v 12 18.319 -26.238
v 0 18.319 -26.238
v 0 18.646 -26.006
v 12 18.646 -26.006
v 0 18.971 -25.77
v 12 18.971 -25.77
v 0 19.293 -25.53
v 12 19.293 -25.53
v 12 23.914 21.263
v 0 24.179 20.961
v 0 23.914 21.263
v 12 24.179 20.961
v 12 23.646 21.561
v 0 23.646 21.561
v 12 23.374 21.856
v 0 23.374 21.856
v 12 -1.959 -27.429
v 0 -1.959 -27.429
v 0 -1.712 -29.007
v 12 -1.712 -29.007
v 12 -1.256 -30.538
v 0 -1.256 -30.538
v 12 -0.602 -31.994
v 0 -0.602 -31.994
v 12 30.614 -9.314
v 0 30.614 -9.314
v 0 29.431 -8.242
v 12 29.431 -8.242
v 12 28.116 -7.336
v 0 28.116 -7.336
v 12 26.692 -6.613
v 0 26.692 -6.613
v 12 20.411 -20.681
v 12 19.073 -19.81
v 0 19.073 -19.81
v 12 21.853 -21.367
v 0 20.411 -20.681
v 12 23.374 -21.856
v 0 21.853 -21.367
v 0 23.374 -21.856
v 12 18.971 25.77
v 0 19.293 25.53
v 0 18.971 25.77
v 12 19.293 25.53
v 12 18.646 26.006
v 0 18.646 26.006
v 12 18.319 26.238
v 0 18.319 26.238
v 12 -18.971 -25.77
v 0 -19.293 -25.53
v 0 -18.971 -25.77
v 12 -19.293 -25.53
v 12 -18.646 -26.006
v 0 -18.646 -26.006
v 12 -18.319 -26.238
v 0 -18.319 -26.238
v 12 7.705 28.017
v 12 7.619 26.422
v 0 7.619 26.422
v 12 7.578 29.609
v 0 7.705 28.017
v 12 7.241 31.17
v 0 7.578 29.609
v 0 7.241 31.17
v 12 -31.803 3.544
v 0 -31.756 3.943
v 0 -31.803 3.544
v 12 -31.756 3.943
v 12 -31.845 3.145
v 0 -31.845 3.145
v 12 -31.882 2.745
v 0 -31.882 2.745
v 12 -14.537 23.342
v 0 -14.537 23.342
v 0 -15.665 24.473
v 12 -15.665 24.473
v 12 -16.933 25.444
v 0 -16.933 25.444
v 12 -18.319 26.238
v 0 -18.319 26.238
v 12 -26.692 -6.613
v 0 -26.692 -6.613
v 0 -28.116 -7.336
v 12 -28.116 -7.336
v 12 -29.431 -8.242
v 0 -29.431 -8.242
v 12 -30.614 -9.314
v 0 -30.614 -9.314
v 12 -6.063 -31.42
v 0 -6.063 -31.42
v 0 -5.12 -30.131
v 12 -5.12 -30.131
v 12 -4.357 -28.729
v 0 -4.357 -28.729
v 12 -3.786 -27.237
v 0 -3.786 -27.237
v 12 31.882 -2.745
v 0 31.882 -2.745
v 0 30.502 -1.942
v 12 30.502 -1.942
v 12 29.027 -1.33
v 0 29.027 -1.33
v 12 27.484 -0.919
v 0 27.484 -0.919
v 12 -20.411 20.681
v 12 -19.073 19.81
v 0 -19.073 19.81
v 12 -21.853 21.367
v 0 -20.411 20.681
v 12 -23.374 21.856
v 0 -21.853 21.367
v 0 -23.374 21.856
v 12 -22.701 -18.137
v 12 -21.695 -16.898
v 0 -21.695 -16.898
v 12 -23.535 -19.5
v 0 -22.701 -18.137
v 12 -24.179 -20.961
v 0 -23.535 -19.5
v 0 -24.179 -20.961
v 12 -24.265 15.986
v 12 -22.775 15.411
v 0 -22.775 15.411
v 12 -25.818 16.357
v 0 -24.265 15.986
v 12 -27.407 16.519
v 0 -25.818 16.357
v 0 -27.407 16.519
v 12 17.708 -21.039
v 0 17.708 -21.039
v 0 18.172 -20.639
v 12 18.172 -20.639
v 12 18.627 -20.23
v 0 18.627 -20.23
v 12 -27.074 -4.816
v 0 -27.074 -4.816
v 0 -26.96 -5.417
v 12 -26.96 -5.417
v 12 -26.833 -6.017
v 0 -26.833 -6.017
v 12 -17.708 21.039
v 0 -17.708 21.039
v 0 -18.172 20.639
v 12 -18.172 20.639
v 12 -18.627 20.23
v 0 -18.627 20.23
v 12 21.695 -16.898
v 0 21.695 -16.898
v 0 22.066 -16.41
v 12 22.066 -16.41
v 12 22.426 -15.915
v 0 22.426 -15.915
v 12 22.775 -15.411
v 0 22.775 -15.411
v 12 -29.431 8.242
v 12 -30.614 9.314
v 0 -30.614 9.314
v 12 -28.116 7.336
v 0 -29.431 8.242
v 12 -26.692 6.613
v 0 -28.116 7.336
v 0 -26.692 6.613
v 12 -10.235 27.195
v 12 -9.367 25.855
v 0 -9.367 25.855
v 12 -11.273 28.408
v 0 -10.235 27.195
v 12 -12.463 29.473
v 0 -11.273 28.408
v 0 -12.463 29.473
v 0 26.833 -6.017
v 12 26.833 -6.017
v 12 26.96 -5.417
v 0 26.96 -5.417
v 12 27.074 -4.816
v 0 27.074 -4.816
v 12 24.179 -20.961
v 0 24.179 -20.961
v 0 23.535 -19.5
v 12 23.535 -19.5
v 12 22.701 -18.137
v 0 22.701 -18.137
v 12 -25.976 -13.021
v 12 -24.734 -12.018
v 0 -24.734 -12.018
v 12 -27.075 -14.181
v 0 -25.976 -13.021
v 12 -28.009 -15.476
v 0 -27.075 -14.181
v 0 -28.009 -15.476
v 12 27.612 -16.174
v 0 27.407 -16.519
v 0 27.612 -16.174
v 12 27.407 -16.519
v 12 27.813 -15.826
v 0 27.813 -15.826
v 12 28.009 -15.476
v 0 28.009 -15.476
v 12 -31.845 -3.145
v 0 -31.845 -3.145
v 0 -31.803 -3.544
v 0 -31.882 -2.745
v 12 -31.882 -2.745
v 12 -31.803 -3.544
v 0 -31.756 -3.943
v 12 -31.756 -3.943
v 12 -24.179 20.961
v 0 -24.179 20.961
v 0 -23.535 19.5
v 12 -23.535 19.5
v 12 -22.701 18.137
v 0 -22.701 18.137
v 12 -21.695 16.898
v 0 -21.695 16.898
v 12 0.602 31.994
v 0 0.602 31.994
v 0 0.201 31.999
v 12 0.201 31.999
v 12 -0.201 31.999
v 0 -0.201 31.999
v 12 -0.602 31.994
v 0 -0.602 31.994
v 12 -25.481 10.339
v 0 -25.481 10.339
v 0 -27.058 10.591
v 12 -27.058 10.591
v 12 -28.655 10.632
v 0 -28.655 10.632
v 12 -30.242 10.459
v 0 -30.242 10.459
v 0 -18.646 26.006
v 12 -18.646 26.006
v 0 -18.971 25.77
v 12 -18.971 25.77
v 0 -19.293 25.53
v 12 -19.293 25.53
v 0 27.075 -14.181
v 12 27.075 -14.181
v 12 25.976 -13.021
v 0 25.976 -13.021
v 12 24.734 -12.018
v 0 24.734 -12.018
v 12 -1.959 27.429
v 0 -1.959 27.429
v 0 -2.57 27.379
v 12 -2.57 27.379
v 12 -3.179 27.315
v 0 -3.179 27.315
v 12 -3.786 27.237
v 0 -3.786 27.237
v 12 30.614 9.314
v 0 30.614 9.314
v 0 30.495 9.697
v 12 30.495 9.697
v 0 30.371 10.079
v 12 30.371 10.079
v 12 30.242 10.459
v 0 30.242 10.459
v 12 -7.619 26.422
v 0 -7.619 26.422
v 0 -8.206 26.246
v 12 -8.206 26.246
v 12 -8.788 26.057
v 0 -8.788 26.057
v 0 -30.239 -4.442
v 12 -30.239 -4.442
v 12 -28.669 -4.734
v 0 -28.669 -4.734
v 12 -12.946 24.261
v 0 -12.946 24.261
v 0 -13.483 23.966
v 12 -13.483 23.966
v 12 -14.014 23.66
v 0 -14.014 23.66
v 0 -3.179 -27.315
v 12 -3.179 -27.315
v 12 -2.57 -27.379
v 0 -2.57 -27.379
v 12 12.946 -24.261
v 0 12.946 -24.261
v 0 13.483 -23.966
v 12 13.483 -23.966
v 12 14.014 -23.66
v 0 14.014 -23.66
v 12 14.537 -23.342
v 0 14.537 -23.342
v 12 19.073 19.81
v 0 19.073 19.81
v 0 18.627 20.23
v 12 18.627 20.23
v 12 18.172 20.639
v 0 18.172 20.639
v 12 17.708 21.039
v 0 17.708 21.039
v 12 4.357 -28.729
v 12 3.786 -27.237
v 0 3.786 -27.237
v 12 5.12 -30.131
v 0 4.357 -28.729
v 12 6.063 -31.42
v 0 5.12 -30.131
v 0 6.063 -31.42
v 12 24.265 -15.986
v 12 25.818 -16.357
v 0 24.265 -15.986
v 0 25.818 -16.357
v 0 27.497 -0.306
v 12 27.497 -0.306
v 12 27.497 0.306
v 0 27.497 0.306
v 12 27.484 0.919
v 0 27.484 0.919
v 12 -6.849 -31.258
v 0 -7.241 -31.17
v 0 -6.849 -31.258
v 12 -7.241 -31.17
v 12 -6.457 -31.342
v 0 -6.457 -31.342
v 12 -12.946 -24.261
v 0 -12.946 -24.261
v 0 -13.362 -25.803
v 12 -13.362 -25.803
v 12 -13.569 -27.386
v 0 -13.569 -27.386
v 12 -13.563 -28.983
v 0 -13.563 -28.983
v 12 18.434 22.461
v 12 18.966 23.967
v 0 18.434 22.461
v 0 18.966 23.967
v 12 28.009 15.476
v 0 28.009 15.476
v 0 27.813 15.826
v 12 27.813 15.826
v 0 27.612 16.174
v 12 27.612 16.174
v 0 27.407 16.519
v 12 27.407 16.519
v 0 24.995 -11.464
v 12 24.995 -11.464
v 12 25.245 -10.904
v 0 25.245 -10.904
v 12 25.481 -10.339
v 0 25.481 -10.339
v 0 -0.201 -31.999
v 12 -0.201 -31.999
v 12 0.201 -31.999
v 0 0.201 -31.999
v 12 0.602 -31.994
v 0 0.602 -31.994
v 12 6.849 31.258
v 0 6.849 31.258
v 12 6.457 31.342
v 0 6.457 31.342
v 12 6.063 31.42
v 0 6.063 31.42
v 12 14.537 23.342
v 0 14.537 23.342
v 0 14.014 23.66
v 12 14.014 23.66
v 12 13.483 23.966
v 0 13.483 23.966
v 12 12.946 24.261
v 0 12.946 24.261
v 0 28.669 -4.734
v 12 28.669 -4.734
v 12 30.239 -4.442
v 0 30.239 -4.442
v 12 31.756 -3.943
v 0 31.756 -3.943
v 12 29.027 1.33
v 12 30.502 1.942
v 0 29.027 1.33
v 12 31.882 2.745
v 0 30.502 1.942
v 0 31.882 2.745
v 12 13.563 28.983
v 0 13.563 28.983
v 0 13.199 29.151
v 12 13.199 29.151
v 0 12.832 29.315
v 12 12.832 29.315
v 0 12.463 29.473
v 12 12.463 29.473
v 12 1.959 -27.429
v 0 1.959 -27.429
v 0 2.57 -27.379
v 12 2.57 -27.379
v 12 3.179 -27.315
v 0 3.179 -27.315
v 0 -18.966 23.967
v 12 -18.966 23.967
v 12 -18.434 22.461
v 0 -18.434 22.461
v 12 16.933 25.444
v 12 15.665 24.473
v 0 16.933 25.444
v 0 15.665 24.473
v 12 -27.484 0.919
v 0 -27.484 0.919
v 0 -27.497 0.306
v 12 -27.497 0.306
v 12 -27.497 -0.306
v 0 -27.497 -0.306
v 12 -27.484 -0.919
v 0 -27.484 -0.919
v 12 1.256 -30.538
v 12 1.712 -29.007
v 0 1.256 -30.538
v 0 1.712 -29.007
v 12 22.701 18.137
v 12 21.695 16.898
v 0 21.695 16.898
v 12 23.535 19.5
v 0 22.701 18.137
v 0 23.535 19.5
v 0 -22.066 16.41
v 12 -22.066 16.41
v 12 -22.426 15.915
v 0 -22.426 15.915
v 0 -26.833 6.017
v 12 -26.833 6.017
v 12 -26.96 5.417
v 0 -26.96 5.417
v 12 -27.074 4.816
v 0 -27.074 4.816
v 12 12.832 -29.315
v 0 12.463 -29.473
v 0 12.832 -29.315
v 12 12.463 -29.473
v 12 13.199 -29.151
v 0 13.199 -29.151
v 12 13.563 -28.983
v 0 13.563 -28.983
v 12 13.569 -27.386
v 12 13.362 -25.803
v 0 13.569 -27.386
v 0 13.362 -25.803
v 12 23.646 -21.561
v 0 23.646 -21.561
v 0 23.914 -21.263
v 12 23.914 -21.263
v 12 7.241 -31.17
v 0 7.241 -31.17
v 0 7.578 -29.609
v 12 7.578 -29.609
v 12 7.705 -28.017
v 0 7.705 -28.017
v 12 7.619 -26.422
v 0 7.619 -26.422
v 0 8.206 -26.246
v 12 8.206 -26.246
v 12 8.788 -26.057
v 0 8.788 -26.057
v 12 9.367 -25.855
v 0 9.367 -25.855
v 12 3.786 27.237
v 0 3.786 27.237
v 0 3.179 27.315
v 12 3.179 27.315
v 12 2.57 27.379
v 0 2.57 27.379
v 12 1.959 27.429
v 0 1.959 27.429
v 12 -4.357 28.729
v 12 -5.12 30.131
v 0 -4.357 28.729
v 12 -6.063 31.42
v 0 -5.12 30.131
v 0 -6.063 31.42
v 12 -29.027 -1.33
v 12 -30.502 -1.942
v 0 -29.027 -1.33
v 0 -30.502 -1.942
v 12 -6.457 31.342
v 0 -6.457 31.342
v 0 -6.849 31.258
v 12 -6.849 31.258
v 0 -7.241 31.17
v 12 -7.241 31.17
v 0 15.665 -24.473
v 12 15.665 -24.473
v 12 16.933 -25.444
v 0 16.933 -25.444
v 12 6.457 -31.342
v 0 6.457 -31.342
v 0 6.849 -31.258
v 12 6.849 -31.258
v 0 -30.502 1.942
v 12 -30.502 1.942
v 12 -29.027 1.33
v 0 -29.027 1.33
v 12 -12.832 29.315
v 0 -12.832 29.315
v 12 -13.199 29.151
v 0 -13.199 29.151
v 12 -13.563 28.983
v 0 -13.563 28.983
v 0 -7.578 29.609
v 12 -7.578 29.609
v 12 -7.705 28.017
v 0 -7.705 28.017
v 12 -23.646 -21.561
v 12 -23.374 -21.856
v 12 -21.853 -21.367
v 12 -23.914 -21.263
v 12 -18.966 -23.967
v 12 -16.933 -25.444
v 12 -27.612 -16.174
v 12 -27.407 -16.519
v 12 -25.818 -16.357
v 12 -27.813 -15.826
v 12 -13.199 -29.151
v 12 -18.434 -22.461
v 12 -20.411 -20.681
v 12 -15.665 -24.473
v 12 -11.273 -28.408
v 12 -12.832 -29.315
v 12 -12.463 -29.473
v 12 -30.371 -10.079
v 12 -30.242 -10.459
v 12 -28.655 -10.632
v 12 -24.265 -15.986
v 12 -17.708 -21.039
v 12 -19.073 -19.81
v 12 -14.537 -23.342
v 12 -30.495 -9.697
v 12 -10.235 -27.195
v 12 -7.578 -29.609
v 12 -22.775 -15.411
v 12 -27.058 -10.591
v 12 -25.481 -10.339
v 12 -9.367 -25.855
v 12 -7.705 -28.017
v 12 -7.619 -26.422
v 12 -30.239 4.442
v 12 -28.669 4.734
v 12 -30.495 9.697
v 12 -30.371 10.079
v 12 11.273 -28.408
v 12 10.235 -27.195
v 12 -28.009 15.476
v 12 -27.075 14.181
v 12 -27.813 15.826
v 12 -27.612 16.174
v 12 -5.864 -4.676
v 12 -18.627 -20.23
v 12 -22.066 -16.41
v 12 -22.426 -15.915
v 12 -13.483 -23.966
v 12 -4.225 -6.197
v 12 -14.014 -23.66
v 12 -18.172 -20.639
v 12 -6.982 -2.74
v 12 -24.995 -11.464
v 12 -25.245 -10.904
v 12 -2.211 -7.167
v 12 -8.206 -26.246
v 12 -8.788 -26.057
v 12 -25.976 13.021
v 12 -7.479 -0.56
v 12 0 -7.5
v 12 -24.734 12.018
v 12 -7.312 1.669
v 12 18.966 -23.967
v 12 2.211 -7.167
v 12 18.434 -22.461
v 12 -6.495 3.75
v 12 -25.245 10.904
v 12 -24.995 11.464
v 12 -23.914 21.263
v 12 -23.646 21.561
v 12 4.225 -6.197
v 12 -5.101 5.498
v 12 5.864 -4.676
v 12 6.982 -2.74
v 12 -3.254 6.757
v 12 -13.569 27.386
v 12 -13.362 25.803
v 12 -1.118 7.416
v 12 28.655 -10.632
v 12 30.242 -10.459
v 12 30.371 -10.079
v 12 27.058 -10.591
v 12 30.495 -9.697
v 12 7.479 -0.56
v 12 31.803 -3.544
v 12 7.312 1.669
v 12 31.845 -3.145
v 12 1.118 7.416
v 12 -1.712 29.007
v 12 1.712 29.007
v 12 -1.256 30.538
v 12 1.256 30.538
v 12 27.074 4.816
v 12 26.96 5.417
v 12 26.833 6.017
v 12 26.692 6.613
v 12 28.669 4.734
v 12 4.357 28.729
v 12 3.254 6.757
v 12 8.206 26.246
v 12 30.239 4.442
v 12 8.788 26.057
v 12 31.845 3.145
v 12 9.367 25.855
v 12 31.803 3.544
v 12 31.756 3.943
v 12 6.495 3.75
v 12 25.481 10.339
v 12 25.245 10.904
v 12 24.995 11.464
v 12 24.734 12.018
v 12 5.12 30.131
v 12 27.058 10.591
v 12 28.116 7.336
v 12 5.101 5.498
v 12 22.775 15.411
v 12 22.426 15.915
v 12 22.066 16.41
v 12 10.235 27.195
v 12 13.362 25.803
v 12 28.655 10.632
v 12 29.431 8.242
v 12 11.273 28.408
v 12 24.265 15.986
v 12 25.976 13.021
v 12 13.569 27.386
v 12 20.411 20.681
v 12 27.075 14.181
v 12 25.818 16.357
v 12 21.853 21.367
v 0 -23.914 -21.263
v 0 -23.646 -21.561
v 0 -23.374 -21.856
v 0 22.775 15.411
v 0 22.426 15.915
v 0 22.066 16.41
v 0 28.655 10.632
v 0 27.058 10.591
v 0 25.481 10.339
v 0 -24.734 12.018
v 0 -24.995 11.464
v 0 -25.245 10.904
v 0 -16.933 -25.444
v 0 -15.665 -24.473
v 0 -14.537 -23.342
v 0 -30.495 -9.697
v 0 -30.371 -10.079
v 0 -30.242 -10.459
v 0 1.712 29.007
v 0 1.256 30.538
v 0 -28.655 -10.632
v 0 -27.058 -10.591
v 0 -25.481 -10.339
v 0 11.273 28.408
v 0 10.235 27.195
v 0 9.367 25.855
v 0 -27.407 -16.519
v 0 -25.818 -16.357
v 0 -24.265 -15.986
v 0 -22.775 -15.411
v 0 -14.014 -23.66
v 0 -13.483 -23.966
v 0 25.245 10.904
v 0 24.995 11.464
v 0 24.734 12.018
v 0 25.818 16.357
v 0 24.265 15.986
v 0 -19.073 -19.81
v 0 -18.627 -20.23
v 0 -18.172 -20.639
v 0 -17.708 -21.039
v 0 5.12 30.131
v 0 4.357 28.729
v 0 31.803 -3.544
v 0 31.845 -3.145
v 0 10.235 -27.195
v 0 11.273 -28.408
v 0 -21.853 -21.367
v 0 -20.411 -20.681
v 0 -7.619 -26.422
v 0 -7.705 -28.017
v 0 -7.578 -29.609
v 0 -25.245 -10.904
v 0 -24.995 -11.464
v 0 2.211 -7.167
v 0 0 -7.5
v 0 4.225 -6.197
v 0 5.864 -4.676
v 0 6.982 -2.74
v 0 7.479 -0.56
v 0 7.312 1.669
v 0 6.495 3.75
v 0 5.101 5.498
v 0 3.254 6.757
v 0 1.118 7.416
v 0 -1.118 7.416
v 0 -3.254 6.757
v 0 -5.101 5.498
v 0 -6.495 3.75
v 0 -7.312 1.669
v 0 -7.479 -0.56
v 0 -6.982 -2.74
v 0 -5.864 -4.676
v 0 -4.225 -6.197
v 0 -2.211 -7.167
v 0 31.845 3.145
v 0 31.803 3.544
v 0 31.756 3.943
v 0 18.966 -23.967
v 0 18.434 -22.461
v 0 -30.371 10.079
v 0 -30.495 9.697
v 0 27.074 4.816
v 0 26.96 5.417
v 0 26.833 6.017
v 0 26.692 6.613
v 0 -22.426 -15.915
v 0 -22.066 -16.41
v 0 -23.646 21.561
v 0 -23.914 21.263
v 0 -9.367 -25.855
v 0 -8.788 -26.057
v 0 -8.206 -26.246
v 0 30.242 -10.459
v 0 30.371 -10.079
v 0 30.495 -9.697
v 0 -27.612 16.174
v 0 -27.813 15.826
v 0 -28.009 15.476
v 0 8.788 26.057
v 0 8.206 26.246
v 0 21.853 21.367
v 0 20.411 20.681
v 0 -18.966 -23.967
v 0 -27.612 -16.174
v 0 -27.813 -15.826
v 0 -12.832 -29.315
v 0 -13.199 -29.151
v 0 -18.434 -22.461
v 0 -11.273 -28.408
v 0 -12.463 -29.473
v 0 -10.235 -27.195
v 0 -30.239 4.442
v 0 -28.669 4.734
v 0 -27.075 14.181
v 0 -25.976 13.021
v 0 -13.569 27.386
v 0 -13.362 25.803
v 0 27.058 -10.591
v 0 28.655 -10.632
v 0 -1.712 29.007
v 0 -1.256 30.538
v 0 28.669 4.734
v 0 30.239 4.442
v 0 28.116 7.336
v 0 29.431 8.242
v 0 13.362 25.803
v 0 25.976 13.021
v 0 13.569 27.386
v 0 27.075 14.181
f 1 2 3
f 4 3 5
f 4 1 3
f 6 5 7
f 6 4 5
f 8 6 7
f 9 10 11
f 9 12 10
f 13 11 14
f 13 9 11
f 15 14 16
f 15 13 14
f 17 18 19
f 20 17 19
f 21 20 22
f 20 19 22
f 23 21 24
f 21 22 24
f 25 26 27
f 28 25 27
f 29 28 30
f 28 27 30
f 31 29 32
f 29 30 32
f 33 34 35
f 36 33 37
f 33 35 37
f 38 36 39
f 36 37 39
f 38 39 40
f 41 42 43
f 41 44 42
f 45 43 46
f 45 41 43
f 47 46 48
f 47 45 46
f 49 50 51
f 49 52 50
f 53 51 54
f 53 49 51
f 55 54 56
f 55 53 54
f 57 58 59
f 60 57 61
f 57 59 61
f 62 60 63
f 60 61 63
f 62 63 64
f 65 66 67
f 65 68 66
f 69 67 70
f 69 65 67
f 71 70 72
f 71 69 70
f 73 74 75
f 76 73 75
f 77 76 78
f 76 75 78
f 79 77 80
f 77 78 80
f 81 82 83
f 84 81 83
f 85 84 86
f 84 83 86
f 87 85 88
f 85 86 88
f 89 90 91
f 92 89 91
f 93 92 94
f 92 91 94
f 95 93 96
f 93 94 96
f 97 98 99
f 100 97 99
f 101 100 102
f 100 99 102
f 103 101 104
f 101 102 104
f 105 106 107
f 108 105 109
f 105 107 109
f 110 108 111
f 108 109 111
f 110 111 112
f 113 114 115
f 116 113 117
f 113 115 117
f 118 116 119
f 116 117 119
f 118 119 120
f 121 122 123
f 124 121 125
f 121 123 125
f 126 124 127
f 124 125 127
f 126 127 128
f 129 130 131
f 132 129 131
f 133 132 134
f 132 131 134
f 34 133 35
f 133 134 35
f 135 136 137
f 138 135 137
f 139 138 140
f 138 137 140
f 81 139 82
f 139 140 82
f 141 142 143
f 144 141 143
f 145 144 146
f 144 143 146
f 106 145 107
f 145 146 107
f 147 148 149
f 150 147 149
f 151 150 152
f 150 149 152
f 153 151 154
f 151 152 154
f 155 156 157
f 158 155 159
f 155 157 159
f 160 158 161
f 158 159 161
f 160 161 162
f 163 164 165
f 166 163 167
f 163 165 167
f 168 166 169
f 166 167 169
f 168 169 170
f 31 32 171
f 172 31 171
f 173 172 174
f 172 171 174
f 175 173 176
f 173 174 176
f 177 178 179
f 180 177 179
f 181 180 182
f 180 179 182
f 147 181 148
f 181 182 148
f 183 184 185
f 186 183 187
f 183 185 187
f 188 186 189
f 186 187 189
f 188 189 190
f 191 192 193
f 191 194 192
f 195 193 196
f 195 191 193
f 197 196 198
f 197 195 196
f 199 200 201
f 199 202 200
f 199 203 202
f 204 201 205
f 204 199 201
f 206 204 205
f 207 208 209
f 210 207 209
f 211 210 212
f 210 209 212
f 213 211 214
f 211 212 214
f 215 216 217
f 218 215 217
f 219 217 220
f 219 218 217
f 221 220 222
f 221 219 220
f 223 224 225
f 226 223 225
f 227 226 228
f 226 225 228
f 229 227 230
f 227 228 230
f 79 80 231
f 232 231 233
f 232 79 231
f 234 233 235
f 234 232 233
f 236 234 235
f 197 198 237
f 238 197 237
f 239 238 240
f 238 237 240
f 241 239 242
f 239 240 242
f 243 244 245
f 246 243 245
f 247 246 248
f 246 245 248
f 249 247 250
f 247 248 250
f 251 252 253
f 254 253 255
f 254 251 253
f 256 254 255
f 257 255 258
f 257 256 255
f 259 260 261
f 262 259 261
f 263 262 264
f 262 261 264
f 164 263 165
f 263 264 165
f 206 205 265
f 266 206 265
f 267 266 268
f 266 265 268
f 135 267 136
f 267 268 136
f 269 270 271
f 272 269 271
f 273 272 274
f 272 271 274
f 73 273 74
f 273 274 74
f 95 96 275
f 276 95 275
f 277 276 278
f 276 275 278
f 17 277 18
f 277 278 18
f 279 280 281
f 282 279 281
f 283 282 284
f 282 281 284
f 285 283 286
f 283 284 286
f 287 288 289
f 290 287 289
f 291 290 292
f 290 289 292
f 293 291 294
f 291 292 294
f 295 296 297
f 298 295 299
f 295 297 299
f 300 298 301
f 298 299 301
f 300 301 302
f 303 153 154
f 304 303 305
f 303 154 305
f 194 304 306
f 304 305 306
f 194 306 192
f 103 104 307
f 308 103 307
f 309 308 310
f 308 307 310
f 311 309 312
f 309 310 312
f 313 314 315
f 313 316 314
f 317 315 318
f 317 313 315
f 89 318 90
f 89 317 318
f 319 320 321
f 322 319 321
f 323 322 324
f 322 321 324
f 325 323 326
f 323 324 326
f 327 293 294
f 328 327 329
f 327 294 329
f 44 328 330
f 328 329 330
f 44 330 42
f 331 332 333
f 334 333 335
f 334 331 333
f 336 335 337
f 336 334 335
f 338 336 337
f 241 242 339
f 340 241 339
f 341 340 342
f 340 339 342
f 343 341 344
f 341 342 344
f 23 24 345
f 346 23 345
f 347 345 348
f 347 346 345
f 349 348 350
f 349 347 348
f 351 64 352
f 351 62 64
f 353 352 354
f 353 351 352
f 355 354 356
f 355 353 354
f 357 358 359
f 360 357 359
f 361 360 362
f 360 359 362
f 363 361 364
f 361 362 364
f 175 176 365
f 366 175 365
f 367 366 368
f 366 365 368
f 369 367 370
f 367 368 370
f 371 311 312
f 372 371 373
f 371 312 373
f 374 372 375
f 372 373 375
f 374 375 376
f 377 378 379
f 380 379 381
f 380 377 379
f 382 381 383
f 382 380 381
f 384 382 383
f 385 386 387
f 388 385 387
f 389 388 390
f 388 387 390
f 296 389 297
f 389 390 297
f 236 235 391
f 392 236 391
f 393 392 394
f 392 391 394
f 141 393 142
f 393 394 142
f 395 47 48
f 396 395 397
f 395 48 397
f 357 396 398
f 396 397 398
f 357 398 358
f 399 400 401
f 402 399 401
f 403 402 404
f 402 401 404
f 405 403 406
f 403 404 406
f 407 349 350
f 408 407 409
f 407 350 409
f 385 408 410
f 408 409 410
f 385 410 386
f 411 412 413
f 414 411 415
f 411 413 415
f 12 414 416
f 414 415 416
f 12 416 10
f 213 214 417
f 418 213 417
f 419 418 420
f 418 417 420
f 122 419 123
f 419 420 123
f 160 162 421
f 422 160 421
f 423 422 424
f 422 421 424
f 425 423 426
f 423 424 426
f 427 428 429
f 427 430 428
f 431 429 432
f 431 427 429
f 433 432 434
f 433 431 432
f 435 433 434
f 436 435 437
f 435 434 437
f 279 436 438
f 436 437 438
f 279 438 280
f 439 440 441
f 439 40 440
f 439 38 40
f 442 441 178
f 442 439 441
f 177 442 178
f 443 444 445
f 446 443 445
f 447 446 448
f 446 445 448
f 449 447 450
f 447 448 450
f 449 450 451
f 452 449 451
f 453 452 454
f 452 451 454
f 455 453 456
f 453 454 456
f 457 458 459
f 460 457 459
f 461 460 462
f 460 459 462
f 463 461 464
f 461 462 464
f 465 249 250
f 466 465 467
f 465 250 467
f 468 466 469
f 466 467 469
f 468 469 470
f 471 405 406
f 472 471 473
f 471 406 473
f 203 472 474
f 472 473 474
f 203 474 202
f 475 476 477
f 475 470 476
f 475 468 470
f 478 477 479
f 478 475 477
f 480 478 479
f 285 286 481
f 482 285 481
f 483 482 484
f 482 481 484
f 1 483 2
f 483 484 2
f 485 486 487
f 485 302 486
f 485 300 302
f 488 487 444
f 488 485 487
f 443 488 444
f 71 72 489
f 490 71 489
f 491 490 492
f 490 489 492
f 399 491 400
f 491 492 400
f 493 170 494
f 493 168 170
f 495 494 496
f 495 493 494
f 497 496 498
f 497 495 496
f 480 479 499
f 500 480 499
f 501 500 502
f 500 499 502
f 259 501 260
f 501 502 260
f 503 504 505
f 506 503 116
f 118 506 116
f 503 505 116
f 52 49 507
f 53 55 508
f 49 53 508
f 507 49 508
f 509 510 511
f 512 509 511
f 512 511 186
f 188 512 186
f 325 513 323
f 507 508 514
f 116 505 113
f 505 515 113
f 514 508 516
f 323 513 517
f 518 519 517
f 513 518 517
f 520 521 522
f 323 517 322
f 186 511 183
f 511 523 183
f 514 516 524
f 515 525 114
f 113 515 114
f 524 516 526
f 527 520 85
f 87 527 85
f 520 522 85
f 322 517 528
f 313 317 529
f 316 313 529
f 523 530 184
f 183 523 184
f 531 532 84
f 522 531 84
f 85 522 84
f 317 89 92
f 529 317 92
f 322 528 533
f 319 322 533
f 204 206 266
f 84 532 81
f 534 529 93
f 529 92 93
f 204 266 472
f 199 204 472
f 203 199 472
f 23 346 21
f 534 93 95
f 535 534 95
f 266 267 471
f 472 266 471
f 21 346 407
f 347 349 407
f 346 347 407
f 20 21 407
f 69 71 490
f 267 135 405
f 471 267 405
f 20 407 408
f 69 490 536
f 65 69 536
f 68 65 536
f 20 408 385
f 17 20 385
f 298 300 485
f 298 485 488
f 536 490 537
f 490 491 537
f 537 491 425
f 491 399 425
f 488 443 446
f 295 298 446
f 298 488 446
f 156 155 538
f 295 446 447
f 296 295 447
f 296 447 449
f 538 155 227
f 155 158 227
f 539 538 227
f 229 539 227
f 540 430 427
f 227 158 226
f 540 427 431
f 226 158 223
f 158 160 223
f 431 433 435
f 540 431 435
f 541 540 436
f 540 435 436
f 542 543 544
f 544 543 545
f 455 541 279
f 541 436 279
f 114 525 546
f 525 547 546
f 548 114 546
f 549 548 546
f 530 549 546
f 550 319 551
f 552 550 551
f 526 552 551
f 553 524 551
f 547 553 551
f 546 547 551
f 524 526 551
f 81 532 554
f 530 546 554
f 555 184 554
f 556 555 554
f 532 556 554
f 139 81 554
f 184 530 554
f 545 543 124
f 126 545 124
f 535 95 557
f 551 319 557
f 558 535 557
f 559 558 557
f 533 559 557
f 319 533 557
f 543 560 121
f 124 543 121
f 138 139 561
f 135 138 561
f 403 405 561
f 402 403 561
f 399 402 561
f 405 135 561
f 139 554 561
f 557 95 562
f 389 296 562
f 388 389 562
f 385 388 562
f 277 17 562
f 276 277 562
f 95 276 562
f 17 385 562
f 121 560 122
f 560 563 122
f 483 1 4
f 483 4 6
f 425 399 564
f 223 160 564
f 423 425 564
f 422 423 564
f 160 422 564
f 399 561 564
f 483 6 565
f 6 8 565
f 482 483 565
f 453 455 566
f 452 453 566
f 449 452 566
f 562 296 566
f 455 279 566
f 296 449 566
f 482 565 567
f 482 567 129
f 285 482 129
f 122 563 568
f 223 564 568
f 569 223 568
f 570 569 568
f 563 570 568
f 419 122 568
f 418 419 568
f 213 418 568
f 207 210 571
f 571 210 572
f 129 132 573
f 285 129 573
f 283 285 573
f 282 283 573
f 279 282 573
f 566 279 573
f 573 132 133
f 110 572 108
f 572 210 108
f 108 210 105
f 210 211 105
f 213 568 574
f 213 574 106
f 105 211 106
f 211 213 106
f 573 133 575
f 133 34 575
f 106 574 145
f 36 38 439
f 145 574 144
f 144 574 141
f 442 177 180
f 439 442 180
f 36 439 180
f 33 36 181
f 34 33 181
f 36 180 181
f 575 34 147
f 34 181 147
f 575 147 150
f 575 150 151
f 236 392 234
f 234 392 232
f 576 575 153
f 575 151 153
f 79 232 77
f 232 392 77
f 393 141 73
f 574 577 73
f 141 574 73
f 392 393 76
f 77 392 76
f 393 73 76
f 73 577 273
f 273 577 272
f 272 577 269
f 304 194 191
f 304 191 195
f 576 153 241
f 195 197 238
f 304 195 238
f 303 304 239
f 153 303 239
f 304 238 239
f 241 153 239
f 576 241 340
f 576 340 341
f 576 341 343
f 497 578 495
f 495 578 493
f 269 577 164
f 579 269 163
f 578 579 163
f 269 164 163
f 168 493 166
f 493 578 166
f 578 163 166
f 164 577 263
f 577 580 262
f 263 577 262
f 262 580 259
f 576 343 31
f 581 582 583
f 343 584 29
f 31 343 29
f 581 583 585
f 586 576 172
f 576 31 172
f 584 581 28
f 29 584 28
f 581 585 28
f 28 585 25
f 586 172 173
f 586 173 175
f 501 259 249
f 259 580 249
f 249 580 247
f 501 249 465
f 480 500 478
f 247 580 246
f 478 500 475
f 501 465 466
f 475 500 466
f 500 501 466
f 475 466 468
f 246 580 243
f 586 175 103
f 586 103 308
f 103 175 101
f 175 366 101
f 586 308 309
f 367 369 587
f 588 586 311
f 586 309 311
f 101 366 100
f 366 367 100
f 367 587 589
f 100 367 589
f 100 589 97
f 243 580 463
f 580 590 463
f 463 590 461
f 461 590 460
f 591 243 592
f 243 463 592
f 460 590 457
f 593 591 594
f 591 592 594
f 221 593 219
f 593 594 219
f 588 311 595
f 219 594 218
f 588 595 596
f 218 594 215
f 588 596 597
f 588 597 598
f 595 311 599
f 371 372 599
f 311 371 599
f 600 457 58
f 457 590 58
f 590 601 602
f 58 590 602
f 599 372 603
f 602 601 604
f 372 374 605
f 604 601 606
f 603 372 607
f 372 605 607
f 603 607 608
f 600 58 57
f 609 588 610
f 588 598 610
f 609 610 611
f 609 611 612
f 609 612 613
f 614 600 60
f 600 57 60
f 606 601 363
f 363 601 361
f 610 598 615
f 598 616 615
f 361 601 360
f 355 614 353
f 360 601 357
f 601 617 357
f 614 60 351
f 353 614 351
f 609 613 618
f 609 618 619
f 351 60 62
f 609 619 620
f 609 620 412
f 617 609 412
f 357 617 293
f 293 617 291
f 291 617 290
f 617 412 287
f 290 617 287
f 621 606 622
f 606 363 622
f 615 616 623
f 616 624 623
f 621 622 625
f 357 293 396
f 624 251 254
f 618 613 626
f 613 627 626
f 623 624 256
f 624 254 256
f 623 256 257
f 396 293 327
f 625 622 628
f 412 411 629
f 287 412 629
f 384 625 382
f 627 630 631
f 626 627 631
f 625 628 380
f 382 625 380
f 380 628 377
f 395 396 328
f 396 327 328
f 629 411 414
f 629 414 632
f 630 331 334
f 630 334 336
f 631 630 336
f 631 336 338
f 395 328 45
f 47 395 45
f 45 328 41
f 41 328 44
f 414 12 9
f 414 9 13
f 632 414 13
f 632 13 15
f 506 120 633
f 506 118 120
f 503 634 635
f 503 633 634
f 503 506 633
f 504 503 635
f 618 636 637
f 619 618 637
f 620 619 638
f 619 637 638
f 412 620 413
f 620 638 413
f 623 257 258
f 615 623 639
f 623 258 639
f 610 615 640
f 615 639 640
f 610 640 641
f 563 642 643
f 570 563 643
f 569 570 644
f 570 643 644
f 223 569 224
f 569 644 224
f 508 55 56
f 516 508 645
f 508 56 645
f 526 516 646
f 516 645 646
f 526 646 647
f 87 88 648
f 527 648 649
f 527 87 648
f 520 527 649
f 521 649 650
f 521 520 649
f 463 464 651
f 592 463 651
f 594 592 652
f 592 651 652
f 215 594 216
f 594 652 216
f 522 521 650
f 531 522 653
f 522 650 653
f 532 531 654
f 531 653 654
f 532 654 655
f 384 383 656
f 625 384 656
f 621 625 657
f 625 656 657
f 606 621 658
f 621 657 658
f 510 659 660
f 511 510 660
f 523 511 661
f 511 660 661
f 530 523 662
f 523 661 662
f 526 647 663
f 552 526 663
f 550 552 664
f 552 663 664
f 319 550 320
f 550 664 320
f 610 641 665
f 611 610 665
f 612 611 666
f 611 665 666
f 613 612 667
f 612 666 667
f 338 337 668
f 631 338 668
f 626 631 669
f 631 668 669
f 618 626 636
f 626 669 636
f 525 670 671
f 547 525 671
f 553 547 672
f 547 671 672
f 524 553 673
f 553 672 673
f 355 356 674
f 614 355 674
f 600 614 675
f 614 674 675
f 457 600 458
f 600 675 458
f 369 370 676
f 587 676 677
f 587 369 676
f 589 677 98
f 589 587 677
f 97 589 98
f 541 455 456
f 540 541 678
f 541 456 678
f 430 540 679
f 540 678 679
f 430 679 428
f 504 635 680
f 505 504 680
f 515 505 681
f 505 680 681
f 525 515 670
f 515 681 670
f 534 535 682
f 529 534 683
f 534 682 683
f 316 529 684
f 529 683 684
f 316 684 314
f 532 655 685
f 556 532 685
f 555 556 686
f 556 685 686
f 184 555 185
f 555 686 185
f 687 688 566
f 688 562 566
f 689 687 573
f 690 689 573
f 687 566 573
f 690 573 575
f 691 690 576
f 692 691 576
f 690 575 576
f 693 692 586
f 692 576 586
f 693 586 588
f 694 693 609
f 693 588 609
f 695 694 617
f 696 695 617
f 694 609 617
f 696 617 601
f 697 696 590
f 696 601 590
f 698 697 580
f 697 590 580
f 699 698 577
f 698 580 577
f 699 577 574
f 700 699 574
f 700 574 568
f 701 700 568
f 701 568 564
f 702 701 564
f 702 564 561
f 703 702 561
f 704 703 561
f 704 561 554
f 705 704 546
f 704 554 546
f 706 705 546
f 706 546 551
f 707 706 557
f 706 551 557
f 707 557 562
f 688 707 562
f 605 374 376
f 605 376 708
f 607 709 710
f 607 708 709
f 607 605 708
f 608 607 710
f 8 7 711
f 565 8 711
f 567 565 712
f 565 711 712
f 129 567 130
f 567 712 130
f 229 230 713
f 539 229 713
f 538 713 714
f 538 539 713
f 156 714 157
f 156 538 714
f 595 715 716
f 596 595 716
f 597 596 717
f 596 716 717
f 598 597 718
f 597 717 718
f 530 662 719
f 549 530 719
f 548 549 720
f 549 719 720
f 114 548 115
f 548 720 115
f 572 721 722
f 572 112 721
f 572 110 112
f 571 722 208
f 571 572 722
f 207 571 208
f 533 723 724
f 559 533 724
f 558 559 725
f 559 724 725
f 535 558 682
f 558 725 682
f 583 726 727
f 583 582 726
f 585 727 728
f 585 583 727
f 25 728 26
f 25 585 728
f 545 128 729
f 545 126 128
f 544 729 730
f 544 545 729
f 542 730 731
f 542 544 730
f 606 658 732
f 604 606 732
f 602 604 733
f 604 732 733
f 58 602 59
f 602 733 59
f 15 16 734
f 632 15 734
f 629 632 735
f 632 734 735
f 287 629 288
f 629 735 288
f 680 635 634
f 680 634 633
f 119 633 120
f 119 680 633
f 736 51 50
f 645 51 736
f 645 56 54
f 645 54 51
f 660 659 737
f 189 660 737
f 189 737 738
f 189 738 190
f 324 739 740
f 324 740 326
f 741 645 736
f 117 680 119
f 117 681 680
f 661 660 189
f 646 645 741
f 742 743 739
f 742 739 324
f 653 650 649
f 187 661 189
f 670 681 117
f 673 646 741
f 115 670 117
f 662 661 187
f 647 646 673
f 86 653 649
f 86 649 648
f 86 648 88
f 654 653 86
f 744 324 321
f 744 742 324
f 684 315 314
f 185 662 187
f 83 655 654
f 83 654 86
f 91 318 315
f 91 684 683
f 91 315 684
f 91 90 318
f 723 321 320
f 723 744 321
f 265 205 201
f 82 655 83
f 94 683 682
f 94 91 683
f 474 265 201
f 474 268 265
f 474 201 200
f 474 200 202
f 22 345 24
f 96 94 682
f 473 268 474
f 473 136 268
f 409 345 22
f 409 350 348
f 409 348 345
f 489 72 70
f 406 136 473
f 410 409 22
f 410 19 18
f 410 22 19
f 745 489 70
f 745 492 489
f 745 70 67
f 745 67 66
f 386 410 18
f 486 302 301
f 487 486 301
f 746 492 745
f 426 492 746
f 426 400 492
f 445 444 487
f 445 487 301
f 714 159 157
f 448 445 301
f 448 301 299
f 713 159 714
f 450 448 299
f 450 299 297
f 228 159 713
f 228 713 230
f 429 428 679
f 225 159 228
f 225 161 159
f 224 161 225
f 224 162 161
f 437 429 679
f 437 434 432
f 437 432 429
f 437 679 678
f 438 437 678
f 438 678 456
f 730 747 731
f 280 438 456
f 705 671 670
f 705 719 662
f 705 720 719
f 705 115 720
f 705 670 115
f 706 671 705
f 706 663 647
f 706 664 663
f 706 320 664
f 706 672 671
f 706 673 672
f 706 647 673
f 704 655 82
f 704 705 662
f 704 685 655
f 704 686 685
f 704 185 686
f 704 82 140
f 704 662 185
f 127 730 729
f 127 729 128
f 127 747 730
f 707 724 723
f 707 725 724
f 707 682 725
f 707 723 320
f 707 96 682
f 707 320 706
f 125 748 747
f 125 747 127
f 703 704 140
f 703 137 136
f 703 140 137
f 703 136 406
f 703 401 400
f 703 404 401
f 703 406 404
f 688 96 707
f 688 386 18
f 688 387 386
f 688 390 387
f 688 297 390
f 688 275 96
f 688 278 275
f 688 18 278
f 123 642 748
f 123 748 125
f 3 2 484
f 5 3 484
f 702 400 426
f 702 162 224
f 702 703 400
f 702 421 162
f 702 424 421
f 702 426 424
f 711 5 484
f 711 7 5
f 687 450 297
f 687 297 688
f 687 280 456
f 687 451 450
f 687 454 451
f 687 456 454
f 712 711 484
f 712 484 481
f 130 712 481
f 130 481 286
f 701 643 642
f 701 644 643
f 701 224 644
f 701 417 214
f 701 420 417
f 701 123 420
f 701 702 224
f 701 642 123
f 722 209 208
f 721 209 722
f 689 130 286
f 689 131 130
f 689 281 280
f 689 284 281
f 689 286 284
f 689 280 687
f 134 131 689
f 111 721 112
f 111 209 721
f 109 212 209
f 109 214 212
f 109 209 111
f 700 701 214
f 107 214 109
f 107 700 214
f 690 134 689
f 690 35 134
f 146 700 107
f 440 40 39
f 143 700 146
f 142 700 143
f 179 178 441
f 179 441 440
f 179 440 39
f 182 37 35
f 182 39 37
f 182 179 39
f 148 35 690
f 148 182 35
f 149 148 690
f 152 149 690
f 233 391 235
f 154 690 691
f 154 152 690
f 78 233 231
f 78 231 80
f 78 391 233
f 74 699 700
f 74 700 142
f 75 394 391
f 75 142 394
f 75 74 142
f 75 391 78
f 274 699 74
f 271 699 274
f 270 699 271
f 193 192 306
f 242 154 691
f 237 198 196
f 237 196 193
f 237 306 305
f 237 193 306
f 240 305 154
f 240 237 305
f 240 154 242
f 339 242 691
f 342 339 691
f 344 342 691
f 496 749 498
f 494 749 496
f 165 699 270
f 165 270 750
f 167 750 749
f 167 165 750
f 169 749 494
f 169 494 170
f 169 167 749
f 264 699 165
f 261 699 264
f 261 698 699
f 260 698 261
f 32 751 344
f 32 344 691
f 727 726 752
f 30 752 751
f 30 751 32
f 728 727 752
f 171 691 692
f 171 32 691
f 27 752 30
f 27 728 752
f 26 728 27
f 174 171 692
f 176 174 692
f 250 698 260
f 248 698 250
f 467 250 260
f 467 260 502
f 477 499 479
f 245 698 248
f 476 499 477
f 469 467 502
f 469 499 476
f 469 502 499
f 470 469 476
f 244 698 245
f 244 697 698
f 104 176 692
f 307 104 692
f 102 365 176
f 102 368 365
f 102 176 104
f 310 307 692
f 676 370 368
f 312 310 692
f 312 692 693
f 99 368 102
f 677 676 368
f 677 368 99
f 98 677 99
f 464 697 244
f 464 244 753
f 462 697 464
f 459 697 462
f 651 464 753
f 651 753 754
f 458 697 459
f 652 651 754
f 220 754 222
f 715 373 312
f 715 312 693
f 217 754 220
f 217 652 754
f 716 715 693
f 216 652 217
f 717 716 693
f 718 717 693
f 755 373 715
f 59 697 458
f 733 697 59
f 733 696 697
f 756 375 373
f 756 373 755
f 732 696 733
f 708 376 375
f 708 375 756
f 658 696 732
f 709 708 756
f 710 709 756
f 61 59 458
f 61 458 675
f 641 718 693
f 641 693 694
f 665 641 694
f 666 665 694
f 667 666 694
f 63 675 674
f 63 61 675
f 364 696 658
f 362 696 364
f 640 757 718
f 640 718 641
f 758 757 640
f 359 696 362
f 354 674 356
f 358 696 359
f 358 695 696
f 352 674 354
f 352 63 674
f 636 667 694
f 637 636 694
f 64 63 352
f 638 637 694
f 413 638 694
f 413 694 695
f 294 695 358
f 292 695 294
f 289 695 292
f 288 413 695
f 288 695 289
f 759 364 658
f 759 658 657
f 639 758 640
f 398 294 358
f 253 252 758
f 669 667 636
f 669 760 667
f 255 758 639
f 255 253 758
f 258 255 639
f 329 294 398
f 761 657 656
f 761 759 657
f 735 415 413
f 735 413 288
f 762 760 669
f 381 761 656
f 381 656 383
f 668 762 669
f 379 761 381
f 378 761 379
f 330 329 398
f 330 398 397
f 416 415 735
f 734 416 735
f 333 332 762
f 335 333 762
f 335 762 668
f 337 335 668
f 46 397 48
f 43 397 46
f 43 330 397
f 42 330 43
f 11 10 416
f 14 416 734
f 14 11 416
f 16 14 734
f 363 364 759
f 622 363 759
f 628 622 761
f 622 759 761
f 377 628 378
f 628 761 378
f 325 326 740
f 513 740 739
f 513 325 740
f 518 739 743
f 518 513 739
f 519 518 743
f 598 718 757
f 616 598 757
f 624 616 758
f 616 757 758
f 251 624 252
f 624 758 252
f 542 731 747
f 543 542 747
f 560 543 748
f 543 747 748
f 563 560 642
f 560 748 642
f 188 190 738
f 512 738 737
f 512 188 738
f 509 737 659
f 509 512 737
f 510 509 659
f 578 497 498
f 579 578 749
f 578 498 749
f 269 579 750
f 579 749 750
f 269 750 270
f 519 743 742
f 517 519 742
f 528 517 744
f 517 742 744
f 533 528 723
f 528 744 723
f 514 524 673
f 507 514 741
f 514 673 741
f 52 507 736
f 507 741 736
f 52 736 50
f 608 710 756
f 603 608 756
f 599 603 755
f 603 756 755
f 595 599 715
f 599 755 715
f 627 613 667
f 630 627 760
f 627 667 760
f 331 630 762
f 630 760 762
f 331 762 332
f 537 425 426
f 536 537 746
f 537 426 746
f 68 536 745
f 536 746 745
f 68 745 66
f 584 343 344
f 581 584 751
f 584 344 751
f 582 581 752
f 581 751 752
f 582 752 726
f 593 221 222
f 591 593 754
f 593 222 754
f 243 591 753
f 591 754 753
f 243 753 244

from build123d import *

# Parameters (mm, degrees)
BASPROSKE_W     = 12
BASPROSKE_H     = 32
TOOTHCUT_DEPTH  = 13
TEETHCUTS_COUNT = 30
TEETHCUTS_ANGLE = 348
BORSKE_R        = 7.5
BORE_DEPTH      = 50.0000508


with BuildPart() as part:
    # BasProSke → Base-Revolve (revolve)
    with BuildSketch(Plane(origin=(0, 0, 0), x_dir=(1, 0, 0), z_dir=(0, 1, 0))):
        with Locations((6, 16)):
            Rectangle(BASPROSKE_W, BASPROSKE_H)
    revolve(axis=Axis((-10, 0, 0), (1, 0, 0)))

    # TooCutSke → ToothCut (cut, through all)
    with BuildSketch(Plane(origin=(0, 0, 0), x_dir=(0, 0, -1), z_dir=(1, 0, 0))):
        with BuildLine():
            ThreePointArc((0.918551563, 27.483654488), (0, 27.499), (-0.918551563, 27.483654488))
            ThreePointArc((-0.918551563, 27.483654488), (-1.617208176, 29.787801627), (-2.761784709, 31.906093311))
            ThreePointArc((-2.761784709, 31.906093311), (0, 32.0254), (2.761784709, 31.906093311))
            ThreePointArc((2.761784709, 31.906093311), (1.617208176, 29.787801627), (0.918551563, 27.483654488))
        make_face()
    toothcut = extrude(amount=TOOTHCUT_DEPTH, mode=Mode.SUBTRACT)

    # TeethCuts: ToothCut ×30 about axis
    teethcuts_axis = Axis((-10, 0, 0), (1, 0, 0))
    for i in range(1, TEETHCUTS_COUNT):
        add(toothcut.rotate(teethcuts_axis, i * TEETHCUTS_ANGLE / (TEETHCUTS_COUNT - 1)), mode=Mode.SUBTRACT)

    # BorSke → Bore (cut, symmetric)
    with BuildSketch(Plane(origin=(0, 0, 0), x_dir=(0, 0, -1), z_dir=(1, 0, 0))):
        Circle(BORSKE_R)
    extrude(amount=BORE_DEPTH, both=True, mode=Mode.SUBTRACT)


solid = part.part
